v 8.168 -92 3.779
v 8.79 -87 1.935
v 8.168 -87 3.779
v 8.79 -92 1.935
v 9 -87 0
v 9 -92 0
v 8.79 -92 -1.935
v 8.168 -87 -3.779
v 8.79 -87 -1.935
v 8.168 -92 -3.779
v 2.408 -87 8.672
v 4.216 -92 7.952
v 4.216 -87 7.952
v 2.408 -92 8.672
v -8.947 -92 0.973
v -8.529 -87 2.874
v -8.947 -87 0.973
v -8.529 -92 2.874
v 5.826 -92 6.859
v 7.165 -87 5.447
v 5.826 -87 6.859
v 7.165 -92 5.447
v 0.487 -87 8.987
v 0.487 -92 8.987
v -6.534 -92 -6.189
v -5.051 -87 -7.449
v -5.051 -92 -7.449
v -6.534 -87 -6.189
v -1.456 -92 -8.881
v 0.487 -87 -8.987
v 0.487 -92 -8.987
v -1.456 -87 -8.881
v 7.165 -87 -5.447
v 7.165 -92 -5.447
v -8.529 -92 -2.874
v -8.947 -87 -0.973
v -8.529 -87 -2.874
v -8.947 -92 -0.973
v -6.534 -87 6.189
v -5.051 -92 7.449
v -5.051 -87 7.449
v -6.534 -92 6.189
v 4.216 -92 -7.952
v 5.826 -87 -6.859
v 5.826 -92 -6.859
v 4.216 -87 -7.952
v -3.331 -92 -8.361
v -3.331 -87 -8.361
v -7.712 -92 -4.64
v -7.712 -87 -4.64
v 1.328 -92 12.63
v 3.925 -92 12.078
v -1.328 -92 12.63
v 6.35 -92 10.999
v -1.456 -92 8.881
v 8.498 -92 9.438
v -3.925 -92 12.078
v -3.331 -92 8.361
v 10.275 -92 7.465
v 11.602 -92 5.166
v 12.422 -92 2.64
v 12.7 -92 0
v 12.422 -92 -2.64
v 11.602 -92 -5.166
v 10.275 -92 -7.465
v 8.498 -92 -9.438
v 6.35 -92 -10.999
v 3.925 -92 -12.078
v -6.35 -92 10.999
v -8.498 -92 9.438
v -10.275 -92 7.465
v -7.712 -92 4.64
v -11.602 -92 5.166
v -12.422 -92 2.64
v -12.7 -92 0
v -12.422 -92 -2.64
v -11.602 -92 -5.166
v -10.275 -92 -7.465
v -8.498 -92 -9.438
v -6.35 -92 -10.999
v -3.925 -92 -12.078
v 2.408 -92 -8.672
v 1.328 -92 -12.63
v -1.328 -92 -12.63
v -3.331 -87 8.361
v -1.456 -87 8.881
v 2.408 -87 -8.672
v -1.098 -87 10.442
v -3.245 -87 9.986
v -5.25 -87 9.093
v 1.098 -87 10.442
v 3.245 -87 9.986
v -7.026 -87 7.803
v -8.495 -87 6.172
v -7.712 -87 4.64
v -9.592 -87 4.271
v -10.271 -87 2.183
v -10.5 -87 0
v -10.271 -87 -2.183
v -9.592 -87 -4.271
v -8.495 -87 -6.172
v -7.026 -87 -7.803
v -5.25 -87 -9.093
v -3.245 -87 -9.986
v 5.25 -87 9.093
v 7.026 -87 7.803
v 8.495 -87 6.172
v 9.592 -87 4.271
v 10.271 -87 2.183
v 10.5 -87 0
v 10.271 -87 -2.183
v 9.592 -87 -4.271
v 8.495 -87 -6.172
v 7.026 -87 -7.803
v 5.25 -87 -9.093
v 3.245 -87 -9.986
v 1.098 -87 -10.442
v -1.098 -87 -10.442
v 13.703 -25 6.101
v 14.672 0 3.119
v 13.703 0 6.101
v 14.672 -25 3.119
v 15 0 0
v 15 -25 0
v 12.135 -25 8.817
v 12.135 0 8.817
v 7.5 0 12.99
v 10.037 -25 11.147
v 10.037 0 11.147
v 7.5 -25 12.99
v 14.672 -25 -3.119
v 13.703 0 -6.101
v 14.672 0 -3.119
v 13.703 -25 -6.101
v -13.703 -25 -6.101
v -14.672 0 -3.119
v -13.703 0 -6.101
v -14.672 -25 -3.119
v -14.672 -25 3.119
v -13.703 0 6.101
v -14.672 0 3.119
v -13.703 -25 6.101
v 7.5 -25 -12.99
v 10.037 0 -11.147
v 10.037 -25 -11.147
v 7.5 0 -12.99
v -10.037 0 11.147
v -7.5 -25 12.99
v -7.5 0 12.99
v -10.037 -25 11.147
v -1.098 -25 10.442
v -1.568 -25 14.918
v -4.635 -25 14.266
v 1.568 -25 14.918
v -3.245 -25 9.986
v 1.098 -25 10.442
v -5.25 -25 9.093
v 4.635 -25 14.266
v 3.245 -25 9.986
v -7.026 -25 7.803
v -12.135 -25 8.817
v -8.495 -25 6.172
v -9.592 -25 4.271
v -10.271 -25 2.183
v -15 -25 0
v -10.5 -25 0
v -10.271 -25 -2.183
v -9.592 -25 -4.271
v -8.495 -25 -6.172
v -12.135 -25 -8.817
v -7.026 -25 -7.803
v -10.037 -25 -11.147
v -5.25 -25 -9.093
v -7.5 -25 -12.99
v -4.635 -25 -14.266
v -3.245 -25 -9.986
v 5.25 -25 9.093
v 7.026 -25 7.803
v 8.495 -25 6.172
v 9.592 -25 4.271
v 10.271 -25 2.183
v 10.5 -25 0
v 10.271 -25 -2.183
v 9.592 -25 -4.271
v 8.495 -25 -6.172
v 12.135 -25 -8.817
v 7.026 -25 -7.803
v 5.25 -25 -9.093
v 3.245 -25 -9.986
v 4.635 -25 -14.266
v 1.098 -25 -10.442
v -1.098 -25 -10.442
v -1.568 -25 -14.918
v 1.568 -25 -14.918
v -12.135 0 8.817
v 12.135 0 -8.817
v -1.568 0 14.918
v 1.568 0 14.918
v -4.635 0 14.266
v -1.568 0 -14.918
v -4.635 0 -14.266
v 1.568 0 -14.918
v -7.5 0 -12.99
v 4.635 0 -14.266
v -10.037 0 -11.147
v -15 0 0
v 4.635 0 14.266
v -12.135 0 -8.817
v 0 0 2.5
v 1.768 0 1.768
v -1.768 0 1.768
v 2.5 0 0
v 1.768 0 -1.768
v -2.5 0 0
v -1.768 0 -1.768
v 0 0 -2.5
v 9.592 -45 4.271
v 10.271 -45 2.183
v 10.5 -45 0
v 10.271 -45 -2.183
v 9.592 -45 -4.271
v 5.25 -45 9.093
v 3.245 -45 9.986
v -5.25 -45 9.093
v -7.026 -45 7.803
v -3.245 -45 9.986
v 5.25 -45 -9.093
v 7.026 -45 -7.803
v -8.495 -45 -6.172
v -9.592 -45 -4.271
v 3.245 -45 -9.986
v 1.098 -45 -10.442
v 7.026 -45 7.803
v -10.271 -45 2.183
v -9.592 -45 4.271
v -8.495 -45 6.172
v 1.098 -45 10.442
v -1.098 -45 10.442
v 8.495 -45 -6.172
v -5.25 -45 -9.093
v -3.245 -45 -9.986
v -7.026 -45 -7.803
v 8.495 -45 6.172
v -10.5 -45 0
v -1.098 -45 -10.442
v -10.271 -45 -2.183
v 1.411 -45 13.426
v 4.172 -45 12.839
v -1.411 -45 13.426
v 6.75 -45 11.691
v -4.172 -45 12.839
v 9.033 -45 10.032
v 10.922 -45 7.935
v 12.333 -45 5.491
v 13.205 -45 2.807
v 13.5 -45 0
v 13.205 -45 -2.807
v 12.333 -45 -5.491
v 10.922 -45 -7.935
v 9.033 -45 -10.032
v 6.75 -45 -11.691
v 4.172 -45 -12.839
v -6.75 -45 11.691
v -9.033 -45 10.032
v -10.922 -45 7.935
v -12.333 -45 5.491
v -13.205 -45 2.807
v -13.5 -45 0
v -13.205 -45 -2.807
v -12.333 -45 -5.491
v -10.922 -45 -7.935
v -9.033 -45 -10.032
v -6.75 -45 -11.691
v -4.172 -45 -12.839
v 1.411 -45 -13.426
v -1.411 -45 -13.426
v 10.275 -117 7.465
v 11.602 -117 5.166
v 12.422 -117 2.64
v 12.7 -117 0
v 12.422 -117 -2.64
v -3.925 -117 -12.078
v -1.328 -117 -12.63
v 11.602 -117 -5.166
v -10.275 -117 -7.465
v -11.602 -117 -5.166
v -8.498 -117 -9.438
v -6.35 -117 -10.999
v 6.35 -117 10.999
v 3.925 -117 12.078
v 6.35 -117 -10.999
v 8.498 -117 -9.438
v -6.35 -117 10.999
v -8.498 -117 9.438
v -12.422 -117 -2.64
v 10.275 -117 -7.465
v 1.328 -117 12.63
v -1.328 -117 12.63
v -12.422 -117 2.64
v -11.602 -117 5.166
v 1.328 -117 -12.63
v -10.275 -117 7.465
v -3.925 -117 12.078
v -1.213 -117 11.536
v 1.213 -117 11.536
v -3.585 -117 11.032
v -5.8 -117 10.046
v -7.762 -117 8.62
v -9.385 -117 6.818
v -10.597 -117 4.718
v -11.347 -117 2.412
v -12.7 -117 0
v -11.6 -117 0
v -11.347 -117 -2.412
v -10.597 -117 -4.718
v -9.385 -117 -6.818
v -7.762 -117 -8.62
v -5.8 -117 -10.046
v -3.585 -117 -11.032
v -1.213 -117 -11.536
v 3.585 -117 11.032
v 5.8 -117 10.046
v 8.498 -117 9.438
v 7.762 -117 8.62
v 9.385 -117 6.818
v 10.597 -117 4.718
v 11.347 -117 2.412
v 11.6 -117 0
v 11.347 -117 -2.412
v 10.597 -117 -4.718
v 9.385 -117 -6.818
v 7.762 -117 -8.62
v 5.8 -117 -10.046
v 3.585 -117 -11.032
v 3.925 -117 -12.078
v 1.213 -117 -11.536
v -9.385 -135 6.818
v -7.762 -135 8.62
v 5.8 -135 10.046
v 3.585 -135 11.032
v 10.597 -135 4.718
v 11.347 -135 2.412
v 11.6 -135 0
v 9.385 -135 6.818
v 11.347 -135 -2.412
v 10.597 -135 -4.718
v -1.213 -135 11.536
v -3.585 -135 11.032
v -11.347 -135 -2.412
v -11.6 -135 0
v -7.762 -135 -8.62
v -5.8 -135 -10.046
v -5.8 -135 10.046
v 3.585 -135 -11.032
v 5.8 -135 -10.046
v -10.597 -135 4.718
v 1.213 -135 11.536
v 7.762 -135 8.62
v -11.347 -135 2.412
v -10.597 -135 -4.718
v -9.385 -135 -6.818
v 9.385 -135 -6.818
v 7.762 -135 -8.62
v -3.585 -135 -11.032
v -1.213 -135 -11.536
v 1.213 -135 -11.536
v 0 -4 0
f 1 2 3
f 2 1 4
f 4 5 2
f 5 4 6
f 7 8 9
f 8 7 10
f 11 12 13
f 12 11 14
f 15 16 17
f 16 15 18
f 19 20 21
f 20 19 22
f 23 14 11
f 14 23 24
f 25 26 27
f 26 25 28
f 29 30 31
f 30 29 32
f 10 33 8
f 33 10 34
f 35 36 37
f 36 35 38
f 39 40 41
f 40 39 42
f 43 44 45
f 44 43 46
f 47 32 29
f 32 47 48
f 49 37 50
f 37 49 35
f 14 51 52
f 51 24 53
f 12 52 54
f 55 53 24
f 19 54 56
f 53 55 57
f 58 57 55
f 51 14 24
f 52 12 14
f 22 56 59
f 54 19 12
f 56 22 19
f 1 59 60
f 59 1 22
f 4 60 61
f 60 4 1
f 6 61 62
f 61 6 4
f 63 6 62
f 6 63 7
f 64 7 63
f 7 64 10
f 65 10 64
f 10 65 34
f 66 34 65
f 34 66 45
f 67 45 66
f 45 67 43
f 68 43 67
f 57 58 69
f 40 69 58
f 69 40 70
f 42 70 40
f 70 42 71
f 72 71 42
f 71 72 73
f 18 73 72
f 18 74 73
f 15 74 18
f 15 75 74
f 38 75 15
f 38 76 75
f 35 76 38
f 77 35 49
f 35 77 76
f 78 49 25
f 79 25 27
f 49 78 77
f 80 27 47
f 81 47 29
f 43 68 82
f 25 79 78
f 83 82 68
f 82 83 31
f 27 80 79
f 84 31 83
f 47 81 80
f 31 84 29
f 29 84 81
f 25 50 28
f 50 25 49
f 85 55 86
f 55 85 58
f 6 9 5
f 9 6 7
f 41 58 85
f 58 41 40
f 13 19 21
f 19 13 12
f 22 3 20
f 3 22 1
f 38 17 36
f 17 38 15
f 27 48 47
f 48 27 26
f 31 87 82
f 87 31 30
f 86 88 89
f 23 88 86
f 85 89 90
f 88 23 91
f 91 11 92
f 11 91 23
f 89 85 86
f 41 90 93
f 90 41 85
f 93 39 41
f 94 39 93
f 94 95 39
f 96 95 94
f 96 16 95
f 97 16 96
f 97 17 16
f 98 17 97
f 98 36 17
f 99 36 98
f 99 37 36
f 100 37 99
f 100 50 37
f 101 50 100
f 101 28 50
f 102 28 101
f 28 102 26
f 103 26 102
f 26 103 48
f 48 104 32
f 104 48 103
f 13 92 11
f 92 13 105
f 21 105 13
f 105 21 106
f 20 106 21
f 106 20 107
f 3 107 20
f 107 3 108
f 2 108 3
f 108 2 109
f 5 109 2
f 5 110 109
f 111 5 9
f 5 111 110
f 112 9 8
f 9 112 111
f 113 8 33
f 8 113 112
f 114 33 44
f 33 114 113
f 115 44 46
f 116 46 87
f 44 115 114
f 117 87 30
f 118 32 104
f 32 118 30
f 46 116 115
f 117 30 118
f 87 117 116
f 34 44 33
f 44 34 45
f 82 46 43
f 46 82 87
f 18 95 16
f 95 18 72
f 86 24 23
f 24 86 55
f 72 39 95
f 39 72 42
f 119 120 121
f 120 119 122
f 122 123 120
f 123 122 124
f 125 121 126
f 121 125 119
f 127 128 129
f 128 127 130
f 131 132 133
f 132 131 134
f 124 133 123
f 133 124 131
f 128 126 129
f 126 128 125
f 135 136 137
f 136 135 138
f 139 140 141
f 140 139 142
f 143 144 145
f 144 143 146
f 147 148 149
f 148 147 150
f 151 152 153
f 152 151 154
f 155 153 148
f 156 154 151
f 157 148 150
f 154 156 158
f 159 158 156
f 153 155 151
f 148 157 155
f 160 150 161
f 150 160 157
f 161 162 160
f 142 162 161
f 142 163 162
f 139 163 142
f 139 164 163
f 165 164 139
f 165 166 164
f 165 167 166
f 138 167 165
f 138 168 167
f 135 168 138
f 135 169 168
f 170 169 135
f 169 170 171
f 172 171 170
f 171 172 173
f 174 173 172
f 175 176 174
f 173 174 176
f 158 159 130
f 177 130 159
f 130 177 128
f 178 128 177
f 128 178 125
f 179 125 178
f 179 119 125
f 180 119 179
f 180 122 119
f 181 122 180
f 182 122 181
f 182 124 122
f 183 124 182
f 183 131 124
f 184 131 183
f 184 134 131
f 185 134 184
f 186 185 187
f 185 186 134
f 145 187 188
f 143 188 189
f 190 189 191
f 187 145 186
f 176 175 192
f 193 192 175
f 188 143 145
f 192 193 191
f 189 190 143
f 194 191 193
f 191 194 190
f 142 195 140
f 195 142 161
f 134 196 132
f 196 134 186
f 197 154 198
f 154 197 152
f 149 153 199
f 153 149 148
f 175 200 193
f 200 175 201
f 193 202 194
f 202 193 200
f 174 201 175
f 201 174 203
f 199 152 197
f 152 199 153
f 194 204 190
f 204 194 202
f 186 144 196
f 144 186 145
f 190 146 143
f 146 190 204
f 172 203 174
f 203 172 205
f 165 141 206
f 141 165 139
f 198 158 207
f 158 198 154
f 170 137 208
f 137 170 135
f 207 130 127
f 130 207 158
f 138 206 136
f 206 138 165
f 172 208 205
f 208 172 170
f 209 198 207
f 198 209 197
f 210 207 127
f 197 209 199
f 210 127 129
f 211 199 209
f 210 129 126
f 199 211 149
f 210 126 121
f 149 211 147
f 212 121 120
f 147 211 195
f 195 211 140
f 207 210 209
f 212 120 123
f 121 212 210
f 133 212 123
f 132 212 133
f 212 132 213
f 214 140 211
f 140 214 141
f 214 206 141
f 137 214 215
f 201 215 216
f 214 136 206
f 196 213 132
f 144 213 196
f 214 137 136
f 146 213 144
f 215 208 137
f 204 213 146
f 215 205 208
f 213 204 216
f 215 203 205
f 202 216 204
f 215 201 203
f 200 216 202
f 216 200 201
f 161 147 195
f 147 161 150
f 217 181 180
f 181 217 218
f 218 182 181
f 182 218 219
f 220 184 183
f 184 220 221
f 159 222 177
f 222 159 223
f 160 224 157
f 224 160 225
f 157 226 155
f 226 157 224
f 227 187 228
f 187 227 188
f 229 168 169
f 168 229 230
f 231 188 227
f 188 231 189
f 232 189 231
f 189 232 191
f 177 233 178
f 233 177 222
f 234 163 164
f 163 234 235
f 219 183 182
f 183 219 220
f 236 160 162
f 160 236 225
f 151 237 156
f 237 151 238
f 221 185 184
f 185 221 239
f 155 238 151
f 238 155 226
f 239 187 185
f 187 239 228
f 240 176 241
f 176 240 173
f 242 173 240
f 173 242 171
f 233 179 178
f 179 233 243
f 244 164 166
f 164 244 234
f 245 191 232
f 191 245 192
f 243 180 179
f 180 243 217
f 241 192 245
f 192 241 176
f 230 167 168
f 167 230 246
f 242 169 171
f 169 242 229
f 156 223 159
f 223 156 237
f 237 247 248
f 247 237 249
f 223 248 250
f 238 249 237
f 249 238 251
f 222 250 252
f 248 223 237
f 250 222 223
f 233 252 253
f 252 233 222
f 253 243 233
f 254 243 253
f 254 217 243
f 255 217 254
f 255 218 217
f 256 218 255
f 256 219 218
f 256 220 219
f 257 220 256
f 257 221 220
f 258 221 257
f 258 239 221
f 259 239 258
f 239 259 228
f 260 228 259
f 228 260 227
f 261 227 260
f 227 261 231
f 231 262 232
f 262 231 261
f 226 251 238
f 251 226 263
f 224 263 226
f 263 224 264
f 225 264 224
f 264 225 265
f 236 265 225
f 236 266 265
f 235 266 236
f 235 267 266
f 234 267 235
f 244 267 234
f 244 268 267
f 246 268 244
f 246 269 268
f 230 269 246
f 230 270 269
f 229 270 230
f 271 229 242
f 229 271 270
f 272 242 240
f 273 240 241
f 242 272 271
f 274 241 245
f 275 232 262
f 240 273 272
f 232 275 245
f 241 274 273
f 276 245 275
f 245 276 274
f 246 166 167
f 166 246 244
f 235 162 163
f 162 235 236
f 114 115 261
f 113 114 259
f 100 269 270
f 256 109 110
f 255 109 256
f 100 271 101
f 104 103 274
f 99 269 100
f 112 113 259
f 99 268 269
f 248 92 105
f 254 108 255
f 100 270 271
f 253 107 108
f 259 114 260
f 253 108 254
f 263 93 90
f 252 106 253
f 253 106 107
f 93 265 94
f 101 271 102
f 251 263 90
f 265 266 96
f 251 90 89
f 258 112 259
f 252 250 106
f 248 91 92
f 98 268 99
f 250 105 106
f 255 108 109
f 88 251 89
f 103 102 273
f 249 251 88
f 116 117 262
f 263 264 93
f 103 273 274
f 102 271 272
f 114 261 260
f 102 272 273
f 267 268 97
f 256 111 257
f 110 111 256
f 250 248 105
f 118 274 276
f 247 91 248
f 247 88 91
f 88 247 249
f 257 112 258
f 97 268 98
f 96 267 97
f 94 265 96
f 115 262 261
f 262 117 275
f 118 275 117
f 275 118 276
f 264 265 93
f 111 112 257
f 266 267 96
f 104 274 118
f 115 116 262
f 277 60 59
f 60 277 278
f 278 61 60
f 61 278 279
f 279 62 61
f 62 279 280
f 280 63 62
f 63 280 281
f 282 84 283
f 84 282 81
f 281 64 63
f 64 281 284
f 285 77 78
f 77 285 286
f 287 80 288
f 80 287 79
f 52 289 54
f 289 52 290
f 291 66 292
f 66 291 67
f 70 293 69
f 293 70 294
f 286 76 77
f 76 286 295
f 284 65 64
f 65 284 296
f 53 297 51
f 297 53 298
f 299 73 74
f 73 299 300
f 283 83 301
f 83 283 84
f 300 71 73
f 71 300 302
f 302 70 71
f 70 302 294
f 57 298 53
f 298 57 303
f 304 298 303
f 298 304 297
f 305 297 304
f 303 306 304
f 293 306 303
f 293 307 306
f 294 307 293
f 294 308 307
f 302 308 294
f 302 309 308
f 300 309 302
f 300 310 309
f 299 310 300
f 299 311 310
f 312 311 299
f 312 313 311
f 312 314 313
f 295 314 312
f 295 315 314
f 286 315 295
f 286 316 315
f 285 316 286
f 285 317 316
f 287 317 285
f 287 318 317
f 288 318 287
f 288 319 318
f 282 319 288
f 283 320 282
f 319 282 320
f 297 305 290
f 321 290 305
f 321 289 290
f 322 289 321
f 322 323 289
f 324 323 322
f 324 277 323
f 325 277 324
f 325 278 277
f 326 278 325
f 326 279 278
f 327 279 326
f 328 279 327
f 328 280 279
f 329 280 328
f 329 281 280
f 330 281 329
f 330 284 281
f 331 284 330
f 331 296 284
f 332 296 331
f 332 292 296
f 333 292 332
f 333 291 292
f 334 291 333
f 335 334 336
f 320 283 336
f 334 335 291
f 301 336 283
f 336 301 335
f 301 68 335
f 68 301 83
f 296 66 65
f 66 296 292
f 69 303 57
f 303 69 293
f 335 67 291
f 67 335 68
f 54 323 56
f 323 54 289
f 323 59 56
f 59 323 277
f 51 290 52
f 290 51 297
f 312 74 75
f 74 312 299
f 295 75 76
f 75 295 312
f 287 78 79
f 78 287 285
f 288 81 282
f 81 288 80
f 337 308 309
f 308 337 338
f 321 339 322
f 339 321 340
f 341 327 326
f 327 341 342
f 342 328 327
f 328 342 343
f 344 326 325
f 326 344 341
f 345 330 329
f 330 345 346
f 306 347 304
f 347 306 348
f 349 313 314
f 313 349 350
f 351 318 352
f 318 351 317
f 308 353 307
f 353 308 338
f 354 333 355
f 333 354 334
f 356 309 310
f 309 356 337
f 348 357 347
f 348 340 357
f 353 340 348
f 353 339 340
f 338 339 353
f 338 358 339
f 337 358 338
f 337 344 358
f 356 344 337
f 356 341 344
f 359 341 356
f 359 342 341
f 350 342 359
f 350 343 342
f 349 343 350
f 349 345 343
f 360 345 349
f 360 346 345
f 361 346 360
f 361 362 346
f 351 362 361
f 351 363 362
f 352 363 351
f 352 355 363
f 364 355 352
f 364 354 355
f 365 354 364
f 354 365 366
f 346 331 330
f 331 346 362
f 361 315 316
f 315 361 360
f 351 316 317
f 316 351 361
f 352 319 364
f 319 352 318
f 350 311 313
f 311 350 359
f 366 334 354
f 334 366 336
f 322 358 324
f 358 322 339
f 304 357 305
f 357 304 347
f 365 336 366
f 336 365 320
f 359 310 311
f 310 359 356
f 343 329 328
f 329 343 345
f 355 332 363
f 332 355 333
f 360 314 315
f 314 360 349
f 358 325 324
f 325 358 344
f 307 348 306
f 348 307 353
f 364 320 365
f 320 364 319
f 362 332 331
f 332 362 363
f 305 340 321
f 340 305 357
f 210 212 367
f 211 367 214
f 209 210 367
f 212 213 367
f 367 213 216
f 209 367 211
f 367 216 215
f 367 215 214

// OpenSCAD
rotate([90,0,0])

 difference()
 {
   color("Gainsboro")
   union()
  {  
   translate([0,0,87])  
   cylinder(5,18/2,18/2);
   
       //gear section
     
     
         cylinder(25,30/2,30/2);
  
     translate([0,0,25])
     cylinder(20,21/2,21/2);
   
   //tapered part
      translate([0,0,45])
      cylinder(42,27/2,21/2);
    
   //BSW
     
   
     translate([0,0,92])
     cylinder(25,25.4/2,25.4/2);
   
   //CD
     translate([0,0,117])
     cylinder(18,23.2/2,23.2/2);
   }
   color("DimGrey")
   cylinder(4,2.5,0);
  }
 
